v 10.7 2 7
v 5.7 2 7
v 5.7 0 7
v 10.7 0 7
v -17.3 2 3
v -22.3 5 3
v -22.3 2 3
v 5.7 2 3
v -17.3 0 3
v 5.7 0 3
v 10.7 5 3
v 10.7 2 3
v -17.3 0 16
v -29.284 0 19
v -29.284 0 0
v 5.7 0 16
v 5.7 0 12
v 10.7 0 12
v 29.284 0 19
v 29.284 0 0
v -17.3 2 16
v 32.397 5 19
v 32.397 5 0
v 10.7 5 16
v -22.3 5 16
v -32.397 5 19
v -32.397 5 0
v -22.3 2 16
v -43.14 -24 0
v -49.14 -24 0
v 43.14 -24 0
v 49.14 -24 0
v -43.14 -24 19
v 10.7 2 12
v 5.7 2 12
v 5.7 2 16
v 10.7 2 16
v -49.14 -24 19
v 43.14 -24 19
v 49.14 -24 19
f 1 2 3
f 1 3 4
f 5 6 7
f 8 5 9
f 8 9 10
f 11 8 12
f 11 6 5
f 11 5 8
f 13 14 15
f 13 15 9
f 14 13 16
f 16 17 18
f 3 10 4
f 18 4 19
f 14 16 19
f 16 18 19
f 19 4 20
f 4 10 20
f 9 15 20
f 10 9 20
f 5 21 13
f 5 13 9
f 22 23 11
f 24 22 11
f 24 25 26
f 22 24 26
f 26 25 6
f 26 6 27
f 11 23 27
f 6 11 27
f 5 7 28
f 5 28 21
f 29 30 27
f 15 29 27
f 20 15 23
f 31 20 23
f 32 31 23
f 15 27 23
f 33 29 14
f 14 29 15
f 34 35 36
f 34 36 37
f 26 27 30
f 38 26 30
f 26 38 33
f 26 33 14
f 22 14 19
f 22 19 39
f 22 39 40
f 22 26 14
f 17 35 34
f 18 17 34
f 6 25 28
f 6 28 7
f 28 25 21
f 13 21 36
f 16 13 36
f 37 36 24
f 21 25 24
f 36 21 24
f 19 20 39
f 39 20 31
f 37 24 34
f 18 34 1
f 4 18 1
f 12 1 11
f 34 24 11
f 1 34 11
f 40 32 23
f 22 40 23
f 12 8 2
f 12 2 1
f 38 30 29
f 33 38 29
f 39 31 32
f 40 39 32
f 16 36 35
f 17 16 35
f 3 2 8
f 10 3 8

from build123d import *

# Parameters (mm, degrees)
BOSS_EXTRUDE1_DEPTH = 19
SKETCH2_W           = 33
SKETCH2_H           = 13
CUT_EXTRUDE1_DEPTH  = 3
CUT_EXTRUDE2_REACH  = 60.752
SKETCH3_W           = 23
SKETCH3_H           = 13
CUT_EXTRUDE3_REACH  = 60.752
SKETCH4_W           = 5
SKETCH4_H           = 5


with BuildPart() as part:
    # Sketch1 → Boss-Extrude1 (new body)
    with BuildSketch(Plane.XY):
        Polygon((-29.283593539, 0), (29.283593539, 0), (43.14, -24), (49.14, -24), (32.396842194, 5), (-32.396842194, 5), (-49.14, -24), (-43.14, -24), align=None)
    extrude(amount=BOSS_EXTRUDE1_DEPTH)

    # Sketch2 → Cut-Extrude1 (cut)
    with BuildSketch(Plane(origin=(0, 5, 0), x_dir=(1, 0, 0), z_dir=(0, 1, 0))):
        with Locations((-5.8, -9.5)):
            Rectangle(SKETCH2_W, SKETCH2_H)
    extrude(amount=-CUT_EXTRUDE1_DEPTH, mode=Mode.SUBTRACT)

    # Sketch3 → Cut-Extrude2 (cut, up to next)
    with BuildSketch(Plane(origin=(0, 2, 0), x_dir=(1, 0, 0), z_dir=(0, 1, 0)), mode=Mode.PRIVATE) as cut_extrude2_sk1:
        with Locations((-5.8, -9.5)):
            Rectangle(SKETCH3_W, SKETCH3_H)
    cut_extrude2_tool1 = extrude(cut_extrude2_sk1.sketch, amount=-CUT_EXTRUDE2_REACH, mode=Mode.PRIVATE) & part.part
    add(cut_extrude2_tool1.solids().sort_by_distance((-5.8, 2, 9.5))[0], mode=Mode.SUBTRACT)

    # Sketch4 → Cut-Extrude3 (cut, up to next)
    with BuildSketch(Plane(origin=(0, 2, 0), x_dir=(1, 0, 0), z_dir=(0, 1, 0)), mode=Mode.PRIVATE) as cut_extrude3_sk1:
        with Locations((8.2, -9.5)):
            Rectangle(SKETCH4_W, SKETCH4_H)
    cut_extrude3_tool1 = extrude(cut_extrude3_sk1.sketch, amount=-CUT_EXTRUDE3_REACH, mode=Mode.PRIVATE) & part.part
    add(cut_extrude3_tool1.solids().sort_by_distance((8.2, 2, 9.5))[0], mode=Mode.SUBTRACT)


solid = part.part
